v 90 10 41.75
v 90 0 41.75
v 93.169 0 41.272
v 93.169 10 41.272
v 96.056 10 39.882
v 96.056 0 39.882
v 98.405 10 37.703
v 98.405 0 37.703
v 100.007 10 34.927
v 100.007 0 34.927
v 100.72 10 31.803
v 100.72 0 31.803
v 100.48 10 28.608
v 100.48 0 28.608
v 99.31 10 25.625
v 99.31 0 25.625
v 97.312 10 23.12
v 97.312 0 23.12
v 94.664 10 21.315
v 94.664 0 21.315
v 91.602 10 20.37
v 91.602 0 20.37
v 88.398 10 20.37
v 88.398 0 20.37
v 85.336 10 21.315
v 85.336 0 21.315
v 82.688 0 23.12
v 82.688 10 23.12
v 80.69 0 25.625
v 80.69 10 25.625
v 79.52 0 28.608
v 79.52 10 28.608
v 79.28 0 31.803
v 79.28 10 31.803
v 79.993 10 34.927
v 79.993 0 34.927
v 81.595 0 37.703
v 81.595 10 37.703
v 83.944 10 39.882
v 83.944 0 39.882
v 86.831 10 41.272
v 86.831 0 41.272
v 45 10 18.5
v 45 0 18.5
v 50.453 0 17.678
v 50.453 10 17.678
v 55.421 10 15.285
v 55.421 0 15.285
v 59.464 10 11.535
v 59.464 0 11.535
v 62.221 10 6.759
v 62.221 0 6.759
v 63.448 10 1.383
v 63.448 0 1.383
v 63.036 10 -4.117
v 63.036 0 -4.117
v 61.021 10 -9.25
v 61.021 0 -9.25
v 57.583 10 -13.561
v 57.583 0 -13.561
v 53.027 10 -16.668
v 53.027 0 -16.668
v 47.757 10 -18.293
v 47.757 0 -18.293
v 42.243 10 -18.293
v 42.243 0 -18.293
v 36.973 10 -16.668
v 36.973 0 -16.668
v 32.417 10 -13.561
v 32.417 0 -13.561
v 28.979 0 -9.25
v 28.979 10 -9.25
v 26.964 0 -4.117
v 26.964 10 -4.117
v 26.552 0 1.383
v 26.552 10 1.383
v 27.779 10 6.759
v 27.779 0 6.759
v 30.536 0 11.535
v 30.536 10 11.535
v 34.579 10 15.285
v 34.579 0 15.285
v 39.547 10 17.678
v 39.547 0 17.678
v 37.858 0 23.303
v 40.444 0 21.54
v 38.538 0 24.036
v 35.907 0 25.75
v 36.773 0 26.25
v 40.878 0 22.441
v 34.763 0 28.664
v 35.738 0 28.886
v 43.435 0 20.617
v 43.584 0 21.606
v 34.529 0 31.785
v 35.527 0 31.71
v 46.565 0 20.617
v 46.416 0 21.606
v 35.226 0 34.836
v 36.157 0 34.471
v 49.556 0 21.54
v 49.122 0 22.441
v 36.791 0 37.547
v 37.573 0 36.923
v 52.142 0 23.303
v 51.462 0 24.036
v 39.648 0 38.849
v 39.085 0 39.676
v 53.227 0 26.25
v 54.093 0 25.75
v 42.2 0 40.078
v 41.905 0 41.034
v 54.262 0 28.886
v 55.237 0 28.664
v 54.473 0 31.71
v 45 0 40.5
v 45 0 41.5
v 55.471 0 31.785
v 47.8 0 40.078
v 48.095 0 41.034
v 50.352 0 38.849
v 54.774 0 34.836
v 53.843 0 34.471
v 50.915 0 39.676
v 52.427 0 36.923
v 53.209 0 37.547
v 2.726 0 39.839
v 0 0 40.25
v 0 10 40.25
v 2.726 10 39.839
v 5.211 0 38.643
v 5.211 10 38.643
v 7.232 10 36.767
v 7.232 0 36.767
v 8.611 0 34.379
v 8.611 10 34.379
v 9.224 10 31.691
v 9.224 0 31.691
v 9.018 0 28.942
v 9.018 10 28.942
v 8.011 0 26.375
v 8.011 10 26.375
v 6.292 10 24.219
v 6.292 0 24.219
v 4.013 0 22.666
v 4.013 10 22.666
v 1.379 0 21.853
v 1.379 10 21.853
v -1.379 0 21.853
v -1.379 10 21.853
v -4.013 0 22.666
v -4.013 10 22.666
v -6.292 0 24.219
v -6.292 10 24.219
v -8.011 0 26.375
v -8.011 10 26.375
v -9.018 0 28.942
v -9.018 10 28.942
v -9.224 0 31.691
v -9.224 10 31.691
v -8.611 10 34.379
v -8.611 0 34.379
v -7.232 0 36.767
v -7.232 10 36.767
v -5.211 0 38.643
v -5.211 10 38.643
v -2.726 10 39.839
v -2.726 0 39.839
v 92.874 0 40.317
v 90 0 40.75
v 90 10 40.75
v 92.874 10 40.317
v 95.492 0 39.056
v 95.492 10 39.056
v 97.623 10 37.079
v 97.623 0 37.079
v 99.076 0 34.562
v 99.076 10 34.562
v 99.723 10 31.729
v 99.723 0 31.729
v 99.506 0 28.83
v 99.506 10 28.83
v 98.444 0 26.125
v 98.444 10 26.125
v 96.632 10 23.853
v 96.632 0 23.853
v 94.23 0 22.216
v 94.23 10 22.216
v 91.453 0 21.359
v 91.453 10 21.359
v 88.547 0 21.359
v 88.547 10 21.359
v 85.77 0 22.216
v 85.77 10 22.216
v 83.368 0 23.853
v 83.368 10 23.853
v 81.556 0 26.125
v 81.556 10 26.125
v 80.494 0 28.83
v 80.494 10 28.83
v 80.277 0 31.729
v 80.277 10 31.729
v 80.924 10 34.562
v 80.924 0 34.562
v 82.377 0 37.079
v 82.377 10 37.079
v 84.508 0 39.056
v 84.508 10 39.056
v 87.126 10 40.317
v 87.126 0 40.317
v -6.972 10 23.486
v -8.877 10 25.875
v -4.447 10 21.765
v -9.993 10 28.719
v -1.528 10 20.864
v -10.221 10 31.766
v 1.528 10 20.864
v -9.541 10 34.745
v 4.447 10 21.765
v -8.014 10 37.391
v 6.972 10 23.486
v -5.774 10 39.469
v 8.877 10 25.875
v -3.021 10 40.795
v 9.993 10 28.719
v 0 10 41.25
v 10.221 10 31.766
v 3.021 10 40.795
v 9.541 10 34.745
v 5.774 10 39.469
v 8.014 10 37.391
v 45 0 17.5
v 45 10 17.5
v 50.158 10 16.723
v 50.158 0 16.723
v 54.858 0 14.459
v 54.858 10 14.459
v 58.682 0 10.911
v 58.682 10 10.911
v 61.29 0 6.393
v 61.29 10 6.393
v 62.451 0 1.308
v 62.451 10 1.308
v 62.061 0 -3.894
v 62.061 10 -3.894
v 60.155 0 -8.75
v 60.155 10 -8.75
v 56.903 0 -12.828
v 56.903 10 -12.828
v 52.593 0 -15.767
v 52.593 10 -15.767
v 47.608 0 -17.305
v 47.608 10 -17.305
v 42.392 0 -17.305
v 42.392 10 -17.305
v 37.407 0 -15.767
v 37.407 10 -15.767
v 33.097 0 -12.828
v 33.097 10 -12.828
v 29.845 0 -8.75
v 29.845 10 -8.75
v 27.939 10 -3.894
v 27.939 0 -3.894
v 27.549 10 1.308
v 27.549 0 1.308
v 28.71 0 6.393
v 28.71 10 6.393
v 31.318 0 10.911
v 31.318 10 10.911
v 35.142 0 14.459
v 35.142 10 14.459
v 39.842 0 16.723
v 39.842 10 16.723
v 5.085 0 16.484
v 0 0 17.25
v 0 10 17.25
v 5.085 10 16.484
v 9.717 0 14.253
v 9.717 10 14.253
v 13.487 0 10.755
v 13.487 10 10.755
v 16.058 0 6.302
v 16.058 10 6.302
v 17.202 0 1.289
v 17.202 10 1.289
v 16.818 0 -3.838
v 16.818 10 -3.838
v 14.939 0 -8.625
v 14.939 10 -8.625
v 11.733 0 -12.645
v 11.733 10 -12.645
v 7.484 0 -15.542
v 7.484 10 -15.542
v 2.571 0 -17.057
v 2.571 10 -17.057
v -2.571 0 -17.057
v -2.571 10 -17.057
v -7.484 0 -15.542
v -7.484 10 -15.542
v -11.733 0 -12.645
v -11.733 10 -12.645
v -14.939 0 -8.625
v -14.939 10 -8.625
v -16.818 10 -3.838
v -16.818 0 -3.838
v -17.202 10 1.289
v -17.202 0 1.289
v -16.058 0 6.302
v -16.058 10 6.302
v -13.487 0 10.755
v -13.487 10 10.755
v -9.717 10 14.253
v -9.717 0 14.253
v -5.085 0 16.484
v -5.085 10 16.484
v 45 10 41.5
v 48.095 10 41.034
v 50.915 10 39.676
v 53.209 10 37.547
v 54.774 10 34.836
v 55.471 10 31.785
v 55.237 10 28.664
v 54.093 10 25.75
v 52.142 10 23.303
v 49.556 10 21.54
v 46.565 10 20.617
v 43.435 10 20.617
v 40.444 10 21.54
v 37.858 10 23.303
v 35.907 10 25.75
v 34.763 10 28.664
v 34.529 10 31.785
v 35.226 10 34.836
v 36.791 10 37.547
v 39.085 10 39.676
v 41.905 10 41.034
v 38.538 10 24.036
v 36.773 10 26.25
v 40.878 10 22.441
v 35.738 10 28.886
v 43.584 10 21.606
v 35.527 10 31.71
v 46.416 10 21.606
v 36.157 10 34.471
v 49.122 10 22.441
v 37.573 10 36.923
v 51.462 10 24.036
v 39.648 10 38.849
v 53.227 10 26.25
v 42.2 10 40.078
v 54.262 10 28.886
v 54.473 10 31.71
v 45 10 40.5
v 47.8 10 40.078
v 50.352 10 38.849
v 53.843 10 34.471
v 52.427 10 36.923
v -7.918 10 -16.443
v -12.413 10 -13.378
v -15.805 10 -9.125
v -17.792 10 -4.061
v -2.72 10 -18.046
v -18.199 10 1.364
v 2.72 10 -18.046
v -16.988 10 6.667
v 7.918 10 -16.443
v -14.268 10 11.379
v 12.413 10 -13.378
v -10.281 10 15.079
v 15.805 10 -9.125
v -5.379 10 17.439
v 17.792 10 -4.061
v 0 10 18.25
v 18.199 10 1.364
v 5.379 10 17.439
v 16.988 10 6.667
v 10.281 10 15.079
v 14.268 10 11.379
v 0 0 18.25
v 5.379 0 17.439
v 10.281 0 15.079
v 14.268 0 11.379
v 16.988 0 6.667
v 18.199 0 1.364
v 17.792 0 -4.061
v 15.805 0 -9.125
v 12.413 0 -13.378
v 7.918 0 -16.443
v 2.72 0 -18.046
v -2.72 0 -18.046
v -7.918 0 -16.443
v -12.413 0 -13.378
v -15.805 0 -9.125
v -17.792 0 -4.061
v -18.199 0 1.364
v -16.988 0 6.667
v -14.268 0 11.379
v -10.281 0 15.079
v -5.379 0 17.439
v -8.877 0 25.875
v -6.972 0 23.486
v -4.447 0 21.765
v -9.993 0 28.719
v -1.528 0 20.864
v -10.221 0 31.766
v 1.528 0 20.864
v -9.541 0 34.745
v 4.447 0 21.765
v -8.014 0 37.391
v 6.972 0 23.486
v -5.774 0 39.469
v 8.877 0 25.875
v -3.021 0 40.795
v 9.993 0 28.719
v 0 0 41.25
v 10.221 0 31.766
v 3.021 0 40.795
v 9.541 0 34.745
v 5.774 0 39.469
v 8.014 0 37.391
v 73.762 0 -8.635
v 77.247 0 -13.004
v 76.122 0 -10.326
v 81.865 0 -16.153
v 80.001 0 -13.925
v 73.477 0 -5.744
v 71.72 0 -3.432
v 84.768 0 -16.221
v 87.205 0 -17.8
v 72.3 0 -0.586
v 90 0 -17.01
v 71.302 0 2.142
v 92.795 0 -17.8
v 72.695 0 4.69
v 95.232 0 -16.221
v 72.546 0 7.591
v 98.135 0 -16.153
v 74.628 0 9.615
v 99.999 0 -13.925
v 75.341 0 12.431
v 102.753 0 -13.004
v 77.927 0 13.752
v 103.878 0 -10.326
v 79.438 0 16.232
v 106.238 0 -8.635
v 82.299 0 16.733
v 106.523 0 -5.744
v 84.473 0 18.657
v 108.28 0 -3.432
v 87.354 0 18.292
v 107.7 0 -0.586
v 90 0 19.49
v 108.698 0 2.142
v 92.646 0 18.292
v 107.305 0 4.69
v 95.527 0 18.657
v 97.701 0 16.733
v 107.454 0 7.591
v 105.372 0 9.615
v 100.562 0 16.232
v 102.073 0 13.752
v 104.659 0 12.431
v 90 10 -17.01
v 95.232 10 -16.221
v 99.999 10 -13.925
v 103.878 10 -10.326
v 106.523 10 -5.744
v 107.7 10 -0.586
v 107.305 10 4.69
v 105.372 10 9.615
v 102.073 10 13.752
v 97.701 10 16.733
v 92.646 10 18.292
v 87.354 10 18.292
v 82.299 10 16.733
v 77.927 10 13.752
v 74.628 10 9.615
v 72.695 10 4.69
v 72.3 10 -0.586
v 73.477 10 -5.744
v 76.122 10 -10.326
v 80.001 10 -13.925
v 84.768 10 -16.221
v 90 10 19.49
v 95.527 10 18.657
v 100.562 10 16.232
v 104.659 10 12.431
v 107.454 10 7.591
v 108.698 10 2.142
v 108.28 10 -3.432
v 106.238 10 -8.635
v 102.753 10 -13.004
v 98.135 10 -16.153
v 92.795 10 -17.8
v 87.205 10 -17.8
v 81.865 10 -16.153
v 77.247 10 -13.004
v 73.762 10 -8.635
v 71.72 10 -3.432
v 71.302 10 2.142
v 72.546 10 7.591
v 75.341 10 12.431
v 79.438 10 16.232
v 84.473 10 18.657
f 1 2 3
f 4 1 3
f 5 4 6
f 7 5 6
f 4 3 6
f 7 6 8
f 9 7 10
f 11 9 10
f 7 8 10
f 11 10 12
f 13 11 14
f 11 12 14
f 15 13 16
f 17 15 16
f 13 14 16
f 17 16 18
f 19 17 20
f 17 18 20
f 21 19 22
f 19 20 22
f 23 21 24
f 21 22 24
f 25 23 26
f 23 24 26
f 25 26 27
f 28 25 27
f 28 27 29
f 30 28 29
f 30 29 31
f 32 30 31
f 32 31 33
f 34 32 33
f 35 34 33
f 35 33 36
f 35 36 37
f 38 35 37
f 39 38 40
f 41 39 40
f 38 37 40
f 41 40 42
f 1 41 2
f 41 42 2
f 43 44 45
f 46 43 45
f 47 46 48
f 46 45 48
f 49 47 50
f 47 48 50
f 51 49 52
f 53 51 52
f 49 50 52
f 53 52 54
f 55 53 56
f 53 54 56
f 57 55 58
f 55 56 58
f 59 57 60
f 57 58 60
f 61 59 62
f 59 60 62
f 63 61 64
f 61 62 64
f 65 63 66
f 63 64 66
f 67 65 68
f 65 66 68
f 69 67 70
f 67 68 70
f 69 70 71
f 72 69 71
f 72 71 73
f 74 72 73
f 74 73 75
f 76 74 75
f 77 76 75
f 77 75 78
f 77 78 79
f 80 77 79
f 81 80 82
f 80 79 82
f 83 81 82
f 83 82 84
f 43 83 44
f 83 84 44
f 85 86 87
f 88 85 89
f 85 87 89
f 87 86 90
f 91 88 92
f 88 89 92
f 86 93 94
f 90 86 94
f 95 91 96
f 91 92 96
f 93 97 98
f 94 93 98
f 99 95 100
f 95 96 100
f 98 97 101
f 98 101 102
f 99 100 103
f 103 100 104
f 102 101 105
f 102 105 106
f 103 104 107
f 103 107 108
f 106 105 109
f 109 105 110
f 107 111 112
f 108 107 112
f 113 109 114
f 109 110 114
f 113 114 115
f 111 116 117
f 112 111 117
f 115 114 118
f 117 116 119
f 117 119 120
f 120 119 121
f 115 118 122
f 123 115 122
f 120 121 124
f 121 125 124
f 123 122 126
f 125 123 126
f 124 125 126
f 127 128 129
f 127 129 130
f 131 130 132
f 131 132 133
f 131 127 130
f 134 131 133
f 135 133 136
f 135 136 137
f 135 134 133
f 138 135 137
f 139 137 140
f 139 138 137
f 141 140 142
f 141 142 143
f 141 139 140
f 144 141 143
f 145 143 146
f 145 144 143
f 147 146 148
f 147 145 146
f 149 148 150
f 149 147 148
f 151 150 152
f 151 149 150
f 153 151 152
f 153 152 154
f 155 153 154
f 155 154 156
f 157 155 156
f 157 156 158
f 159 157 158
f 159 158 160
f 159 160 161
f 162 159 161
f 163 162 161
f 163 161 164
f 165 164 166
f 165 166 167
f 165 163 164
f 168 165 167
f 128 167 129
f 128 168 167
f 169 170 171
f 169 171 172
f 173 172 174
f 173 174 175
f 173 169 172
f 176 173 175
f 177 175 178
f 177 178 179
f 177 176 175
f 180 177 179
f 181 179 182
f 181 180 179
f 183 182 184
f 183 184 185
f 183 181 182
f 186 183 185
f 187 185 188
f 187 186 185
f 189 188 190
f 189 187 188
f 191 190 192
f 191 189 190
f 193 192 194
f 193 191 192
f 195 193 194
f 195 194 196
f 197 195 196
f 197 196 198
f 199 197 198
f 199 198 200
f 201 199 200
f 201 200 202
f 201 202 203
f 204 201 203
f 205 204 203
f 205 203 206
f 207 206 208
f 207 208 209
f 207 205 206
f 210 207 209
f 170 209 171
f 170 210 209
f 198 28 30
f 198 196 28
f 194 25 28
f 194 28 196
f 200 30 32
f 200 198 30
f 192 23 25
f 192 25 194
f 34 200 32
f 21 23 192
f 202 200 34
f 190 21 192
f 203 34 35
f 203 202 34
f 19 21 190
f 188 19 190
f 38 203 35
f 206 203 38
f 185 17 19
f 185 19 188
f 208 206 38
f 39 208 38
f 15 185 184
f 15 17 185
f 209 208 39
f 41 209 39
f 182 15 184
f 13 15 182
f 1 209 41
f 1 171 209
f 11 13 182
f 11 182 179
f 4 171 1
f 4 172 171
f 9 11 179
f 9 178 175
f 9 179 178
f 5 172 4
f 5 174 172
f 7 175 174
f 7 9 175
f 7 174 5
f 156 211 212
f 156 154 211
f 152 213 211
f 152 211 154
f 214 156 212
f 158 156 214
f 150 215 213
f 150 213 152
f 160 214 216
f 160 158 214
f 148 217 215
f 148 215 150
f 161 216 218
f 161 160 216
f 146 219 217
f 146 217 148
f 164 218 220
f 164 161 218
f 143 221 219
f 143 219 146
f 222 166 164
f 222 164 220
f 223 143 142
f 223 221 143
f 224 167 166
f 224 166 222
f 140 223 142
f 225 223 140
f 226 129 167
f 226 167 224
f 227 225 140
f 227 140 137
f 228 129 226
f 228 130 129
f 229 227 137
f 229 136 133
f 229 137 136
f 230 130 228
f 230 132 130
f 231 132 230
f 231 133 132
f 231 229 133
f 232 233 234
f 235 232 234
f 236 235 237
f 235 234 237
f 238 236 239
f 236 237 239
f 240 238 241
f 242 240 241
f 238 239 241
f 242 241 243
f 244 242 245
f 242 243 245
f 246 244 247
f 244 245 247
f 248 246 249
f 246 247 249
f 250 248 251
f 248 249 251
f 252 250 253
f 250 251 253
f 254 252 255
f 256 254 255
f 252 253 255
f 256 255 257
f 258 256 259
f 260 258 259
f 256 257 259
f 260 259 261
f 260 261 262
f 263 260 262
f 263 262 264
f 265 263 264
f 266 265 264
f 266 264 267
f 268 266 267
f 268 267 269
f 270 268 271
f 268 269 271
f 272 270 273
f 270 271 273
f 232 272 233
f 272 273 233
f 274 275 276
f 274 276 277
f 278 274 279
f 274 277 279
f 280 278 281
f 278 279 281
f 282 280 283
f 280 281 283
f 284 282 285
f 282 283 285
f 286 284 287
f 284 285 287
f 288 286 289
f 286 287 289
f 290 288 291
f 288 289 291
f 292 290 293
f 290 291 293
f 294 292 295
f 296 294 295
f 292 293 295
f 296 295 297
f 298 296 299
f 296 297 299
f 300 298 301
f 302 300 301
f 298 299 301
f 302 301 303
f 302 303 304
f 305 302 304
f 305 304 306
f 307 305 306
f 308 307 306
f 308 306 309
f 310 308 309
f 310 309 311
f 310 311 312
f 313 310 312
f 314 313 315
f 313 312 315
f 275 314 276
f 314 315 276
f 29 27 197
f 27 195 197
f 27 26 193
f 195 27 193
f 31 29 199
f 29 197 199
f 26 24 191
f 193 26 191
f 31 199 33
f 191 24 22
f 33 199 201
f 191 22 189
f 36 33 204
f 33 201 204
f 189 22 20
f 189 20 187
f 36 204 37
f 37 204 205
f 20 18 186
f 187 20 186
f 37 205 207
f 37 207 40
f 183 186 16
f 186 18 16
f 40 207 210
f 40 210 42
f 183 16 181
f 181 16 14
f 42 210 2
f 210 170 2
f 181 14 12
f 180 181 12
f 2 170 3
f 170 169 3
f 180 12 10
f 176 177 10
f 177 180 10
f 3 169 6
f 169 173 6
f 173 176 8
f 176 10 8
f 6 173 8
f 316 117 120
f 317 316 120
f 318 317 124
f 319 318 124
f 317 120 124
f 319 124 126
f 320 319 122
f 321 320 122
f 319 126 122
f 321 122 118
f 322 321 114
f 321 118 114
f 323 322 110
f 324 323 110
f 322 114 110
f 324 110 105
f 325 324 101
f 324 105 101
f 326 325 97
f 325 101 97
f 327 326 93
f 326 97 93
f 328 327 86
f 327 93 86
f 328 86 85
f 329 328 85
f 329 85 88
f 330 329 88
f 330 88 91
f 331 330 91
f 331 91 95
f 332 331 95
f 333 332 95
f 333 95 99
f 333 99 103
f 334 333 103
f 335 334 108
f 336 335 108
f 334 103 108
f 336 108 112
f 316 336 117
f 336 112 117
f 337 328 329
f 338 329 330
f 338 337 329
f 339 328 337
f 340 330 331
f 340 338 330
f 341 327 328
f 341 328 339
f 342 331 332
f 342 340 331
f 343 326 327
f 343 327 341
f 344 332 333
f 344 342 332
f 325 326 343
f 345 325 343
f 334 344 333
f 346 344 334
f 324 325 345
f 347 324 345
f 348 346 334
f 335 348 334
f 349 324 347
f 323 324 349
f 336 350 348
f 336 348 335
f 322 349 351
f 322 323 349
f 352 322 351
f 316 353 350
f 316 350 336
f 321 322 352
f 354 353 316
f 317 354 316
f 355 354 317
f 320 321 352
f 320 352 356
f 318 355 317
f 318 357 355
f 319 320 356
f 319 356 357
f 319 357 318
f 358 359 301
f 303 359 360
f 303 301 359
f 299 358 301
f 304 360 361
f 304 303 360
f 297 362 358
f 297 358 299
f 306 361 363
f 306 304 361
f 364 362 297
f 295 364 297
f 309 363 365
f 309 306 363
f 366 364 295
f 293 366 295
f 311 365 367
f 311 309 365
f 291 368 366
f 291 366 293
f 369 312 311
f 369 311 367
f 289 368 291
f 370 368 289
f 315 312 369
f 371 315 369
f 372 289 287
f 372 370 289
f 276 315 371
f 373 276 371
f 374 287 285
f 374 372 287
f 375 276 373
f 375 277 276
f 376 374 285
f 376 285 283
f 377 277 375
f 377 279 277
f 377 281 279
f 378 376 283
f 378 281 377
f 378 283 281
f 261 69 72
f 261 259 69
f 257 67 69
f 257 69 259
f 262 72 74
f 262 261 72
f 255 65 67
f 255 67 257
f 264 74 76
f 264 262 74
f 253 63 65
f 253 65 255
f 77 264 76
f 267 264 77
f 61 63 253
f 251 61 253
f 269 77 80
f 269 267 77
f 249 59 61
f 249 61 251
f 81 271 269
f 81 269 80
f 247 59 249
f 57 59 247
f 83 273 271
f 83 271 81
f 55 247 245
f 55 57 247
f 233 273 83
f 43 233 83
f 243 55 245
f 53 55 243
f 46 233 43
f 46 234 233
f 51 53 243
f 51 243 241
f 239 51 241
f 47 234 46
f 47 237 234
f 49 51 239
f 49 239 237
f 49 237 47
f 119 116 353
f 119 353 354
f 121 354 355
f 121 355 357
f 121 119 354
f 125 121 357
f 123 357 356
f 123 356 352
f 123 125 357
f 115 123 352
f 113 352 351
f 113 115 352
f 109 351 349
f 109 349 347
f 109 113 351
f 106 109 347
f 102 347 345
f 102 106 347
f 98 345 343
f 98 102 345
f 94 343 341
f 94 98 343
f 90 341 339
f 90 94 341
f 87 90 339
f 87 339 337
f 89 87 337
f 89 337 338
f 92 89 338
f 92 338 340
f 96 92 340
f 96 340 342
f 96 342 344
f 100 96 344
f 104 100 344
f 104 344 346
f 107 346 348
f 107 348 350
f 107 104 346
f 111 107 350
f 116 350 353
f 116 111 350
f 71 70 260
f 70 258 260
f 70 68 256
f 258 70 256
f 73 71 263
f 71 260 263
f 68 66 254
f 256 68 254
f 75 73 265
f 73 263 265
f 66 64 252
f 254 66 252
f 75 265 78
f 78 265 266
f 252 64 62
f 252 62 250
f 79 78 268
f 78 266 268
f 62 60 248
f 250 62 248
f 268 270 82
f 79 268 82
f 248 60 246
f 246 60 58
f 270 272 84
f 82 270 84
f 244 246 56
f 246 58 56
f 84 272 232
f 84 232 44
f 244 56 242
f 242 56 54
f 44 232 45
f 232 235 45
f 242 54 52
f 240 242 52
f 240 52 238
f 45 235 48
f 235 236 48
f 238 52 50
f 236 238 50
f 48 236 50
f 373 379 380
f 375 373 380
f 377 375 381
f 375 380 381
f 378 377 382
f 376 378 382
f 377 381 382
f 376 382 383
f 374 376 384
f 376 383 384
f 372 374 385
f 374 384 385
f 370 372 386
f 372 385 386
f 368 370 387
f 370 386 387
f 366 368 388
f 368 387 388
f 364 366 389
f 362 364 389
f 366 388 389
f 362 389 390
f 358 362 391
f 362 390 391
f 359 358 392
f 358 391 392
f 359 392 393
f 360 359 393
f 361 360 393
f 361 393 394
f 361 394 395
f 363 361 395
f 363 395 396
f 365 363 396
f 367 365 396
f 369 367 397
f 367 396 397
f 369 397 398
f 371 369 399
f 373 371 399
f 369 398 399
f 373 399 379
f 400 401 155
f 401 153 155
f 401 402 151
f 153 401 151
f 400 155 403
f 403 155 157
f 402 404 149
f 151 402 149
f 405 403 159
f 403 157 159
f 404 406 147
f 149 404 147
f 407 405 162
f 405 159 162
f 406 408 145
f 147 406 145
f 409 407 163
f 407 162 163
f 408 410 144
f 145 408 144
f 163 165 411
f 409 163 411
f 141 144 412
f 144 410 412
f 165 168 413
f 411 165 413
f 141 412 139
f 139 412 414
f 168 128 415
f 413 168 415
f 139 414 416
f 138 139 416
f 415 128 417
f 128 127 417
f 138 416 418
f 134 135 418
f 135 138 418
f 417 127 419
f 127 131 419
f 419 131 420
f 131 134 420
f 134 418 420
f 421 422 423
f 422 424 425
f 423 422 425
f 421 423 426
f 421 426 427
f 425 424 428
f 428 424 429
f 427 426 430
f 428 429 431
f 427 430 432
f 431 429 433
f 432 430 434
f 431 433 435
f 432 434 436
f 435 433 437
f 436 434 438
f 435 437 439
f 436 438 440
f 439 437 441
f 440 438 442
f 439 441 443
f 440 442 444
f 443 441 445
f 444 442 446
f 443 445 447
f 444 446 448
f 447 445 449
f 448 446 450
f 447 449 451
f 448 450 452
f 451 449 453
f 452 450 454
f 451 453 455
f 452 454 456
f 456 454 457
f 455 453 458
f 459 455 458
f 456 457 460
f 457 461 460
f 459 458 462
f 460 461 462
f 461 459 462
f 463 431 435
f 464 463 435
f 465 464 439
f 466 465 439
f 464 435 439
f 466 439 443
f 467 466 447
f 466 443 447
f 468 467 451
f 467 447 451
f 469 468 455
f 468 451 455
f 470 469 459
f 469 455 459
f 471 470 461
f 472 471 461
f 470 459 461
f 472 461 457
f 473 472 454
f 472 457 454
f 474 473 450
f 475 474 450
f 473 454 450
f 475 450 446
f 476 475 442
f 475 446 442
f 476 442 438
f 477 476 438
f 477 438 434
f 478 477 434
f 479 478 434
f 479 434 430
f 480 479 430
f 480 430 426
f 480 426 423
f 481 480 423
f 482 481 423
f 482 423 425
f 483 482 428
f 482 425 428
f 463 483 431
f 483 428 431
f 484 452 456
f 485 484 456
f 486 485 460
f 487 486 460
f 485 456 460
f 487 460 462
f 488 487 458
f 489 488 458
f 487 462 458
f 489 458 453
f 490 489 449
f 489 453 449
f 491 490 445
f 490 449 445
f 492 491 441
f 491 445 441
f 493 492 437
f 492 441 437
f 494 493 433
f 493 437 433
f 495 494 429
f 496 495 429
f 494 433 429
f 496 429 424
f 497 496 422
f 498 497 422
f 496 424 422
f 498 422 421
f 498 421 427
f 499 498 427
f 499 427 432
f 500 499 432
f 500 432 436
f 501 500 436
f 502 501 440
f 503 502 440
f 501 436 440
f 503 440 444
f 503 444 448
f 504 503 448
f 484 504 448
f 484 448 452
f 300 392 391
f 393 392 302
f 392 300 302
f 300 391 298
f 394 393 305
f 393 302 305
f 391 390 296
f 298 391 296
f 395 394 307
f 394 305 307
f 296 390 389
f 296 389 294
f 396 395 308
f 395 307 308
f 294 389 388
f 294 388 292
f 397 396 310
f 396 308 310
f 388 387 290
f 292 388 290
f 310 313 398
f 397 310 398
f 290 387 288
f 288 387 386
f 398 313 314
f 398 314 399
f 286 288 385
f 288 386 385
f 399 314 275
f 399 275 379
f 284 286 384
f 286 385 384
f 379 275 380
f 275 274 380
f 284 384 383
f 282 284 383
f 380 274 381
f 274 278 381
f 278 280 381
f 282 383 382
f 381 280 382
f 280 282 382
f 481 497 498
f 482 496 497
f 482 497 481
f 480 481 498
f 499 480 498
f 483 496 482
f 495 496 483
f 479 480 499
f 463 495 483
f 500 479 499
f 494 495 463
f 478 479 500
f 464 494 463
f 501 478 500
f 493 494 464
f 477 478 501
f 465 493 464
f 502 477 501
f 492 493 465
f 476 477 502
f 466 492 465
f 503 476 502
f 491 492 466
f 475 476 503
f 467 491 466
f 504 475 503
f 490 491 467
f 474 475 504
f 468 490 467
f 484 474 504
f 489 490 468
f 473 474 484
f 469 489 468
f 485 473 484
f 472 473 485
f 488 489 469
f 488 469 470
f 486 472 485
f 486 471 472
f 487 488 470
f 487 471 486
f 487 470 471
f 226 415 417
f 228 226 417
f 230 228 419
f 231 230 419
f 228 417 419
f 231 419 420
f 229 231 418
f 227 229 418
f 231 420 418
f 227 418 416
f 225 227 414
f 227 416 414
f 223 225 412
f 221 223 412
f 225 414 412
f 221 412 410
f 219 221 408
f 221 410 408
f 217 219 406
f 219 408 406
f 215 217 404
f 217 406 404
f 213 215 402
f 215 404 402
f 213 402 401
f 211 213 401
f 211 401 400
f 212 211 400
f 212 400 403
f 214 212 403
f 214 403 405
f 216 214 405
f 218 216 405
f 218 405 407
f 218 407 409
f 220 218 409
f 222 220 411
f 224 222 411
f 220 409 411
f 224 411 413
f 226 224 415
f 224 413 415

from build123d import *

# Parameters (mm, degrees)
SKETCH1_R             = 18.25
BOSS_EXTRUDE1_DEPTH   = 10
SKETCH2_R             = 17.25
CUT_EXTRUDE1_DEPTH    = 10
SKETCH3_R             = 18.5
BOSS_EXTRUDE2_DEPTH   = 10
SKETCH4_R             = 17.5
CUT_EXTRUDE2_DEPTH    = 10
SKETCH5_R             = 18.75
BOSS_EXTRUDE3_DEPTH   = 10
SKETCH6_R             = 17.75
CUT_EXTRUDE3_DEPTH    = 10
SKETCH7_R             = 10.25
BOSS_EXTRUDE4_DEPTH   = 10
SKETCH7_R_2           = 10.5
BOSS_EXTRUDE4_2_DEPTH = 10
SKETCH7_R_3           = 10.75
BOSS_EXTRUDE4_3_DEPTH = 10
SKETCH8_R             = 9.25
SKETCH8_R_2           = 9.5
SKETCH8_R_3           = 9.75
CUT_EXTRUDE5_DEPTH    = 10


with BuildPart() as part:
    # Sketch1 → Boss-Extrude1 (new body)
    with BuildSketch(Plane(origin=(0, 0, 0), x_dir=(1, 0, 0), z_dir=(0, 1, 0))):
        with Locations(Location((0, 0, 0), (0, 0, 270))):
            Circle(SKETCH1_R)
    extrude(amount=BOSS_EXTRUDE1_DEPTH)

    # Sketch2 → Cut-Extrude1 (cut)
    with BuildSketch(Plane(origin=(0, 10, 0), x_dir=(1, 0, 0), z_dir=(0, 1, 0))):
        with Locations(Location((0, 0, 0), (0, 0, 270))):
            Circle(SKETCH2_R)
    extrude(amount=-CUT_EXTRUDE1_DEPTH, mode=Mode.SUBTRACT)


with BuildPart() as body_2:
    # Sketch3 → Boss-Extrude2 (new body)
    with BuildSketch(Plane(origin=(0, 0, 0), x_dir=(1, 0, 0), z_dir=(0, 1, 0))):
        with Locations(Location((45, 0, 0), (0, 0, 270))):
            Circle(SKETCH3_R)
    extrude(amount=BOSS_EXTRUDE2_DEPTH)

    # Sketch4 → Cut-Extrude2 (cut)
    with BuildSketch(Plane(origin=(0, 10, 0), x_dir=(1, 0, 0), z_dir=(0, 1, 0))):
        with Locations(Location((45, 0, 0), (0, 0, 270))):
            Circle(SKETCH4_R)
    extrude(amount=-CUT_EXTRUDE2_DEPTH, mode=Mode.SUBTRACT)


with BuildPart() as body_3:
    # Sketch5 → Boss-Extrude3 (new body)
    with BuildSketch(Plane(origin=(0, 0, 0), x_dir=(1, 0, 0), z_dir=(0, 1, 0))):
        with Locations(Location((90, -0.740479822, 0), (0, 0, 270))):
            Circle(SKETCH5_R)
    extrude(amount=BOSS_EXTRUDE3_DEPTH)

    # Sketch6 → Cut-Extrude3 (cut)
    with BuildSketch(Plane.XZ):
        with Locations(Location((90, 0.740479822, 0), (0, 0, 270))):
            Circle(SKETCH6_R)
    extrude(amount=-CUT_EXTRUDE3_DEPTH, mode=Mode.SUBTRACT)


with BuildPart() as body_4:
    # Sketch7 → Boss-Extrude4 (new body)
    with BuildSketch(Plane(origin=(0, 0, 0), x_dir=(1, 0, 0), z_dir=(0, 1, 0))):
        with Locations(Location((0, -31, 0), (0, 0, 270))):
            Circle(SKETCH7_R)
    extrude(amount=BOSS_EXTRUDE4_DEPTH)


with BuildPart() as body_5:
    # Sketch7 → Boss-Extrude4 2 (new body)
    with BuildSketch(Plane(origin=(0, 0, 0), x_dir=(1, 0, 0), z_dir=(0, 1, 0))):
        with Locations(Location((45, -31, 0), (0, 0, 270))):
            Circle(SKETCH7_R_2)
    extrude(amount=BOSS_EXTRUDE4_2_DEPTH)


with BuildPart() as body_6:
    # Sketch7 → Boss-Extrude4 3 (new body)
    with BuildSketch(Plane(origin=(0, 0, 0), x_dir=(1, 0, 0), z_dir=(0, 1, 0))):
        with Locations(Location((90, -31, 0), (0, 0, 270))):
            Circle(SKETCH7_R_3)
    extrude(amount=BOSS_EXTRUDE4_3_DEPTH)


with BuildPart() as cut_extrude5_tool:
    # Sketch8 → Cut-Extrude5 (new body)
    with BuildSketch(Plane(origin=(0, 0, 0), x_dir=(1, 0, 0), z_dir=(0, 1, 0))):
        with Locations(Location((0, -31, 0), (0, 0, 270))):
            Circle(SKETCH8_R)
        with Locations(Location((45, -31, 0), (0, 0, 270))):
            Circle(SKETCH8_R_2)
        with Locations(Location((90, -31, 0), (0, 0, 270))):
            Circle(SKETCH8_R_3)
    extrude(amount=CUT_EXTRUDE5_DEPTH)


with BuildPart() as body_4_1:
    add(body_4.part)

    # Cut-Extrude5: cut by cut_extrude5_tool
    add(cut_extrude5_tool.part, mode=Mode.SUBTRACT)


with BuildPart() as body_5_1:
    add(body_5.part)

    # Cut-Extrude5: cut by cut_extrude5_tool
    add(cut_extrude5_tool.part, mode=Mode.SUBTRACT)


with BuildPart() as body_6_1:
    add(body_6.part)

    # Cut-Extrude5: cut by cut_extrude5_tool
    add(cut_extrude5_tool.part, mode=Mode.SUBTRACT)


solid = Compound([part.part, body_2.part, body_3.part, body_4_1.part, body_5_1.part, body_6_1.part])
